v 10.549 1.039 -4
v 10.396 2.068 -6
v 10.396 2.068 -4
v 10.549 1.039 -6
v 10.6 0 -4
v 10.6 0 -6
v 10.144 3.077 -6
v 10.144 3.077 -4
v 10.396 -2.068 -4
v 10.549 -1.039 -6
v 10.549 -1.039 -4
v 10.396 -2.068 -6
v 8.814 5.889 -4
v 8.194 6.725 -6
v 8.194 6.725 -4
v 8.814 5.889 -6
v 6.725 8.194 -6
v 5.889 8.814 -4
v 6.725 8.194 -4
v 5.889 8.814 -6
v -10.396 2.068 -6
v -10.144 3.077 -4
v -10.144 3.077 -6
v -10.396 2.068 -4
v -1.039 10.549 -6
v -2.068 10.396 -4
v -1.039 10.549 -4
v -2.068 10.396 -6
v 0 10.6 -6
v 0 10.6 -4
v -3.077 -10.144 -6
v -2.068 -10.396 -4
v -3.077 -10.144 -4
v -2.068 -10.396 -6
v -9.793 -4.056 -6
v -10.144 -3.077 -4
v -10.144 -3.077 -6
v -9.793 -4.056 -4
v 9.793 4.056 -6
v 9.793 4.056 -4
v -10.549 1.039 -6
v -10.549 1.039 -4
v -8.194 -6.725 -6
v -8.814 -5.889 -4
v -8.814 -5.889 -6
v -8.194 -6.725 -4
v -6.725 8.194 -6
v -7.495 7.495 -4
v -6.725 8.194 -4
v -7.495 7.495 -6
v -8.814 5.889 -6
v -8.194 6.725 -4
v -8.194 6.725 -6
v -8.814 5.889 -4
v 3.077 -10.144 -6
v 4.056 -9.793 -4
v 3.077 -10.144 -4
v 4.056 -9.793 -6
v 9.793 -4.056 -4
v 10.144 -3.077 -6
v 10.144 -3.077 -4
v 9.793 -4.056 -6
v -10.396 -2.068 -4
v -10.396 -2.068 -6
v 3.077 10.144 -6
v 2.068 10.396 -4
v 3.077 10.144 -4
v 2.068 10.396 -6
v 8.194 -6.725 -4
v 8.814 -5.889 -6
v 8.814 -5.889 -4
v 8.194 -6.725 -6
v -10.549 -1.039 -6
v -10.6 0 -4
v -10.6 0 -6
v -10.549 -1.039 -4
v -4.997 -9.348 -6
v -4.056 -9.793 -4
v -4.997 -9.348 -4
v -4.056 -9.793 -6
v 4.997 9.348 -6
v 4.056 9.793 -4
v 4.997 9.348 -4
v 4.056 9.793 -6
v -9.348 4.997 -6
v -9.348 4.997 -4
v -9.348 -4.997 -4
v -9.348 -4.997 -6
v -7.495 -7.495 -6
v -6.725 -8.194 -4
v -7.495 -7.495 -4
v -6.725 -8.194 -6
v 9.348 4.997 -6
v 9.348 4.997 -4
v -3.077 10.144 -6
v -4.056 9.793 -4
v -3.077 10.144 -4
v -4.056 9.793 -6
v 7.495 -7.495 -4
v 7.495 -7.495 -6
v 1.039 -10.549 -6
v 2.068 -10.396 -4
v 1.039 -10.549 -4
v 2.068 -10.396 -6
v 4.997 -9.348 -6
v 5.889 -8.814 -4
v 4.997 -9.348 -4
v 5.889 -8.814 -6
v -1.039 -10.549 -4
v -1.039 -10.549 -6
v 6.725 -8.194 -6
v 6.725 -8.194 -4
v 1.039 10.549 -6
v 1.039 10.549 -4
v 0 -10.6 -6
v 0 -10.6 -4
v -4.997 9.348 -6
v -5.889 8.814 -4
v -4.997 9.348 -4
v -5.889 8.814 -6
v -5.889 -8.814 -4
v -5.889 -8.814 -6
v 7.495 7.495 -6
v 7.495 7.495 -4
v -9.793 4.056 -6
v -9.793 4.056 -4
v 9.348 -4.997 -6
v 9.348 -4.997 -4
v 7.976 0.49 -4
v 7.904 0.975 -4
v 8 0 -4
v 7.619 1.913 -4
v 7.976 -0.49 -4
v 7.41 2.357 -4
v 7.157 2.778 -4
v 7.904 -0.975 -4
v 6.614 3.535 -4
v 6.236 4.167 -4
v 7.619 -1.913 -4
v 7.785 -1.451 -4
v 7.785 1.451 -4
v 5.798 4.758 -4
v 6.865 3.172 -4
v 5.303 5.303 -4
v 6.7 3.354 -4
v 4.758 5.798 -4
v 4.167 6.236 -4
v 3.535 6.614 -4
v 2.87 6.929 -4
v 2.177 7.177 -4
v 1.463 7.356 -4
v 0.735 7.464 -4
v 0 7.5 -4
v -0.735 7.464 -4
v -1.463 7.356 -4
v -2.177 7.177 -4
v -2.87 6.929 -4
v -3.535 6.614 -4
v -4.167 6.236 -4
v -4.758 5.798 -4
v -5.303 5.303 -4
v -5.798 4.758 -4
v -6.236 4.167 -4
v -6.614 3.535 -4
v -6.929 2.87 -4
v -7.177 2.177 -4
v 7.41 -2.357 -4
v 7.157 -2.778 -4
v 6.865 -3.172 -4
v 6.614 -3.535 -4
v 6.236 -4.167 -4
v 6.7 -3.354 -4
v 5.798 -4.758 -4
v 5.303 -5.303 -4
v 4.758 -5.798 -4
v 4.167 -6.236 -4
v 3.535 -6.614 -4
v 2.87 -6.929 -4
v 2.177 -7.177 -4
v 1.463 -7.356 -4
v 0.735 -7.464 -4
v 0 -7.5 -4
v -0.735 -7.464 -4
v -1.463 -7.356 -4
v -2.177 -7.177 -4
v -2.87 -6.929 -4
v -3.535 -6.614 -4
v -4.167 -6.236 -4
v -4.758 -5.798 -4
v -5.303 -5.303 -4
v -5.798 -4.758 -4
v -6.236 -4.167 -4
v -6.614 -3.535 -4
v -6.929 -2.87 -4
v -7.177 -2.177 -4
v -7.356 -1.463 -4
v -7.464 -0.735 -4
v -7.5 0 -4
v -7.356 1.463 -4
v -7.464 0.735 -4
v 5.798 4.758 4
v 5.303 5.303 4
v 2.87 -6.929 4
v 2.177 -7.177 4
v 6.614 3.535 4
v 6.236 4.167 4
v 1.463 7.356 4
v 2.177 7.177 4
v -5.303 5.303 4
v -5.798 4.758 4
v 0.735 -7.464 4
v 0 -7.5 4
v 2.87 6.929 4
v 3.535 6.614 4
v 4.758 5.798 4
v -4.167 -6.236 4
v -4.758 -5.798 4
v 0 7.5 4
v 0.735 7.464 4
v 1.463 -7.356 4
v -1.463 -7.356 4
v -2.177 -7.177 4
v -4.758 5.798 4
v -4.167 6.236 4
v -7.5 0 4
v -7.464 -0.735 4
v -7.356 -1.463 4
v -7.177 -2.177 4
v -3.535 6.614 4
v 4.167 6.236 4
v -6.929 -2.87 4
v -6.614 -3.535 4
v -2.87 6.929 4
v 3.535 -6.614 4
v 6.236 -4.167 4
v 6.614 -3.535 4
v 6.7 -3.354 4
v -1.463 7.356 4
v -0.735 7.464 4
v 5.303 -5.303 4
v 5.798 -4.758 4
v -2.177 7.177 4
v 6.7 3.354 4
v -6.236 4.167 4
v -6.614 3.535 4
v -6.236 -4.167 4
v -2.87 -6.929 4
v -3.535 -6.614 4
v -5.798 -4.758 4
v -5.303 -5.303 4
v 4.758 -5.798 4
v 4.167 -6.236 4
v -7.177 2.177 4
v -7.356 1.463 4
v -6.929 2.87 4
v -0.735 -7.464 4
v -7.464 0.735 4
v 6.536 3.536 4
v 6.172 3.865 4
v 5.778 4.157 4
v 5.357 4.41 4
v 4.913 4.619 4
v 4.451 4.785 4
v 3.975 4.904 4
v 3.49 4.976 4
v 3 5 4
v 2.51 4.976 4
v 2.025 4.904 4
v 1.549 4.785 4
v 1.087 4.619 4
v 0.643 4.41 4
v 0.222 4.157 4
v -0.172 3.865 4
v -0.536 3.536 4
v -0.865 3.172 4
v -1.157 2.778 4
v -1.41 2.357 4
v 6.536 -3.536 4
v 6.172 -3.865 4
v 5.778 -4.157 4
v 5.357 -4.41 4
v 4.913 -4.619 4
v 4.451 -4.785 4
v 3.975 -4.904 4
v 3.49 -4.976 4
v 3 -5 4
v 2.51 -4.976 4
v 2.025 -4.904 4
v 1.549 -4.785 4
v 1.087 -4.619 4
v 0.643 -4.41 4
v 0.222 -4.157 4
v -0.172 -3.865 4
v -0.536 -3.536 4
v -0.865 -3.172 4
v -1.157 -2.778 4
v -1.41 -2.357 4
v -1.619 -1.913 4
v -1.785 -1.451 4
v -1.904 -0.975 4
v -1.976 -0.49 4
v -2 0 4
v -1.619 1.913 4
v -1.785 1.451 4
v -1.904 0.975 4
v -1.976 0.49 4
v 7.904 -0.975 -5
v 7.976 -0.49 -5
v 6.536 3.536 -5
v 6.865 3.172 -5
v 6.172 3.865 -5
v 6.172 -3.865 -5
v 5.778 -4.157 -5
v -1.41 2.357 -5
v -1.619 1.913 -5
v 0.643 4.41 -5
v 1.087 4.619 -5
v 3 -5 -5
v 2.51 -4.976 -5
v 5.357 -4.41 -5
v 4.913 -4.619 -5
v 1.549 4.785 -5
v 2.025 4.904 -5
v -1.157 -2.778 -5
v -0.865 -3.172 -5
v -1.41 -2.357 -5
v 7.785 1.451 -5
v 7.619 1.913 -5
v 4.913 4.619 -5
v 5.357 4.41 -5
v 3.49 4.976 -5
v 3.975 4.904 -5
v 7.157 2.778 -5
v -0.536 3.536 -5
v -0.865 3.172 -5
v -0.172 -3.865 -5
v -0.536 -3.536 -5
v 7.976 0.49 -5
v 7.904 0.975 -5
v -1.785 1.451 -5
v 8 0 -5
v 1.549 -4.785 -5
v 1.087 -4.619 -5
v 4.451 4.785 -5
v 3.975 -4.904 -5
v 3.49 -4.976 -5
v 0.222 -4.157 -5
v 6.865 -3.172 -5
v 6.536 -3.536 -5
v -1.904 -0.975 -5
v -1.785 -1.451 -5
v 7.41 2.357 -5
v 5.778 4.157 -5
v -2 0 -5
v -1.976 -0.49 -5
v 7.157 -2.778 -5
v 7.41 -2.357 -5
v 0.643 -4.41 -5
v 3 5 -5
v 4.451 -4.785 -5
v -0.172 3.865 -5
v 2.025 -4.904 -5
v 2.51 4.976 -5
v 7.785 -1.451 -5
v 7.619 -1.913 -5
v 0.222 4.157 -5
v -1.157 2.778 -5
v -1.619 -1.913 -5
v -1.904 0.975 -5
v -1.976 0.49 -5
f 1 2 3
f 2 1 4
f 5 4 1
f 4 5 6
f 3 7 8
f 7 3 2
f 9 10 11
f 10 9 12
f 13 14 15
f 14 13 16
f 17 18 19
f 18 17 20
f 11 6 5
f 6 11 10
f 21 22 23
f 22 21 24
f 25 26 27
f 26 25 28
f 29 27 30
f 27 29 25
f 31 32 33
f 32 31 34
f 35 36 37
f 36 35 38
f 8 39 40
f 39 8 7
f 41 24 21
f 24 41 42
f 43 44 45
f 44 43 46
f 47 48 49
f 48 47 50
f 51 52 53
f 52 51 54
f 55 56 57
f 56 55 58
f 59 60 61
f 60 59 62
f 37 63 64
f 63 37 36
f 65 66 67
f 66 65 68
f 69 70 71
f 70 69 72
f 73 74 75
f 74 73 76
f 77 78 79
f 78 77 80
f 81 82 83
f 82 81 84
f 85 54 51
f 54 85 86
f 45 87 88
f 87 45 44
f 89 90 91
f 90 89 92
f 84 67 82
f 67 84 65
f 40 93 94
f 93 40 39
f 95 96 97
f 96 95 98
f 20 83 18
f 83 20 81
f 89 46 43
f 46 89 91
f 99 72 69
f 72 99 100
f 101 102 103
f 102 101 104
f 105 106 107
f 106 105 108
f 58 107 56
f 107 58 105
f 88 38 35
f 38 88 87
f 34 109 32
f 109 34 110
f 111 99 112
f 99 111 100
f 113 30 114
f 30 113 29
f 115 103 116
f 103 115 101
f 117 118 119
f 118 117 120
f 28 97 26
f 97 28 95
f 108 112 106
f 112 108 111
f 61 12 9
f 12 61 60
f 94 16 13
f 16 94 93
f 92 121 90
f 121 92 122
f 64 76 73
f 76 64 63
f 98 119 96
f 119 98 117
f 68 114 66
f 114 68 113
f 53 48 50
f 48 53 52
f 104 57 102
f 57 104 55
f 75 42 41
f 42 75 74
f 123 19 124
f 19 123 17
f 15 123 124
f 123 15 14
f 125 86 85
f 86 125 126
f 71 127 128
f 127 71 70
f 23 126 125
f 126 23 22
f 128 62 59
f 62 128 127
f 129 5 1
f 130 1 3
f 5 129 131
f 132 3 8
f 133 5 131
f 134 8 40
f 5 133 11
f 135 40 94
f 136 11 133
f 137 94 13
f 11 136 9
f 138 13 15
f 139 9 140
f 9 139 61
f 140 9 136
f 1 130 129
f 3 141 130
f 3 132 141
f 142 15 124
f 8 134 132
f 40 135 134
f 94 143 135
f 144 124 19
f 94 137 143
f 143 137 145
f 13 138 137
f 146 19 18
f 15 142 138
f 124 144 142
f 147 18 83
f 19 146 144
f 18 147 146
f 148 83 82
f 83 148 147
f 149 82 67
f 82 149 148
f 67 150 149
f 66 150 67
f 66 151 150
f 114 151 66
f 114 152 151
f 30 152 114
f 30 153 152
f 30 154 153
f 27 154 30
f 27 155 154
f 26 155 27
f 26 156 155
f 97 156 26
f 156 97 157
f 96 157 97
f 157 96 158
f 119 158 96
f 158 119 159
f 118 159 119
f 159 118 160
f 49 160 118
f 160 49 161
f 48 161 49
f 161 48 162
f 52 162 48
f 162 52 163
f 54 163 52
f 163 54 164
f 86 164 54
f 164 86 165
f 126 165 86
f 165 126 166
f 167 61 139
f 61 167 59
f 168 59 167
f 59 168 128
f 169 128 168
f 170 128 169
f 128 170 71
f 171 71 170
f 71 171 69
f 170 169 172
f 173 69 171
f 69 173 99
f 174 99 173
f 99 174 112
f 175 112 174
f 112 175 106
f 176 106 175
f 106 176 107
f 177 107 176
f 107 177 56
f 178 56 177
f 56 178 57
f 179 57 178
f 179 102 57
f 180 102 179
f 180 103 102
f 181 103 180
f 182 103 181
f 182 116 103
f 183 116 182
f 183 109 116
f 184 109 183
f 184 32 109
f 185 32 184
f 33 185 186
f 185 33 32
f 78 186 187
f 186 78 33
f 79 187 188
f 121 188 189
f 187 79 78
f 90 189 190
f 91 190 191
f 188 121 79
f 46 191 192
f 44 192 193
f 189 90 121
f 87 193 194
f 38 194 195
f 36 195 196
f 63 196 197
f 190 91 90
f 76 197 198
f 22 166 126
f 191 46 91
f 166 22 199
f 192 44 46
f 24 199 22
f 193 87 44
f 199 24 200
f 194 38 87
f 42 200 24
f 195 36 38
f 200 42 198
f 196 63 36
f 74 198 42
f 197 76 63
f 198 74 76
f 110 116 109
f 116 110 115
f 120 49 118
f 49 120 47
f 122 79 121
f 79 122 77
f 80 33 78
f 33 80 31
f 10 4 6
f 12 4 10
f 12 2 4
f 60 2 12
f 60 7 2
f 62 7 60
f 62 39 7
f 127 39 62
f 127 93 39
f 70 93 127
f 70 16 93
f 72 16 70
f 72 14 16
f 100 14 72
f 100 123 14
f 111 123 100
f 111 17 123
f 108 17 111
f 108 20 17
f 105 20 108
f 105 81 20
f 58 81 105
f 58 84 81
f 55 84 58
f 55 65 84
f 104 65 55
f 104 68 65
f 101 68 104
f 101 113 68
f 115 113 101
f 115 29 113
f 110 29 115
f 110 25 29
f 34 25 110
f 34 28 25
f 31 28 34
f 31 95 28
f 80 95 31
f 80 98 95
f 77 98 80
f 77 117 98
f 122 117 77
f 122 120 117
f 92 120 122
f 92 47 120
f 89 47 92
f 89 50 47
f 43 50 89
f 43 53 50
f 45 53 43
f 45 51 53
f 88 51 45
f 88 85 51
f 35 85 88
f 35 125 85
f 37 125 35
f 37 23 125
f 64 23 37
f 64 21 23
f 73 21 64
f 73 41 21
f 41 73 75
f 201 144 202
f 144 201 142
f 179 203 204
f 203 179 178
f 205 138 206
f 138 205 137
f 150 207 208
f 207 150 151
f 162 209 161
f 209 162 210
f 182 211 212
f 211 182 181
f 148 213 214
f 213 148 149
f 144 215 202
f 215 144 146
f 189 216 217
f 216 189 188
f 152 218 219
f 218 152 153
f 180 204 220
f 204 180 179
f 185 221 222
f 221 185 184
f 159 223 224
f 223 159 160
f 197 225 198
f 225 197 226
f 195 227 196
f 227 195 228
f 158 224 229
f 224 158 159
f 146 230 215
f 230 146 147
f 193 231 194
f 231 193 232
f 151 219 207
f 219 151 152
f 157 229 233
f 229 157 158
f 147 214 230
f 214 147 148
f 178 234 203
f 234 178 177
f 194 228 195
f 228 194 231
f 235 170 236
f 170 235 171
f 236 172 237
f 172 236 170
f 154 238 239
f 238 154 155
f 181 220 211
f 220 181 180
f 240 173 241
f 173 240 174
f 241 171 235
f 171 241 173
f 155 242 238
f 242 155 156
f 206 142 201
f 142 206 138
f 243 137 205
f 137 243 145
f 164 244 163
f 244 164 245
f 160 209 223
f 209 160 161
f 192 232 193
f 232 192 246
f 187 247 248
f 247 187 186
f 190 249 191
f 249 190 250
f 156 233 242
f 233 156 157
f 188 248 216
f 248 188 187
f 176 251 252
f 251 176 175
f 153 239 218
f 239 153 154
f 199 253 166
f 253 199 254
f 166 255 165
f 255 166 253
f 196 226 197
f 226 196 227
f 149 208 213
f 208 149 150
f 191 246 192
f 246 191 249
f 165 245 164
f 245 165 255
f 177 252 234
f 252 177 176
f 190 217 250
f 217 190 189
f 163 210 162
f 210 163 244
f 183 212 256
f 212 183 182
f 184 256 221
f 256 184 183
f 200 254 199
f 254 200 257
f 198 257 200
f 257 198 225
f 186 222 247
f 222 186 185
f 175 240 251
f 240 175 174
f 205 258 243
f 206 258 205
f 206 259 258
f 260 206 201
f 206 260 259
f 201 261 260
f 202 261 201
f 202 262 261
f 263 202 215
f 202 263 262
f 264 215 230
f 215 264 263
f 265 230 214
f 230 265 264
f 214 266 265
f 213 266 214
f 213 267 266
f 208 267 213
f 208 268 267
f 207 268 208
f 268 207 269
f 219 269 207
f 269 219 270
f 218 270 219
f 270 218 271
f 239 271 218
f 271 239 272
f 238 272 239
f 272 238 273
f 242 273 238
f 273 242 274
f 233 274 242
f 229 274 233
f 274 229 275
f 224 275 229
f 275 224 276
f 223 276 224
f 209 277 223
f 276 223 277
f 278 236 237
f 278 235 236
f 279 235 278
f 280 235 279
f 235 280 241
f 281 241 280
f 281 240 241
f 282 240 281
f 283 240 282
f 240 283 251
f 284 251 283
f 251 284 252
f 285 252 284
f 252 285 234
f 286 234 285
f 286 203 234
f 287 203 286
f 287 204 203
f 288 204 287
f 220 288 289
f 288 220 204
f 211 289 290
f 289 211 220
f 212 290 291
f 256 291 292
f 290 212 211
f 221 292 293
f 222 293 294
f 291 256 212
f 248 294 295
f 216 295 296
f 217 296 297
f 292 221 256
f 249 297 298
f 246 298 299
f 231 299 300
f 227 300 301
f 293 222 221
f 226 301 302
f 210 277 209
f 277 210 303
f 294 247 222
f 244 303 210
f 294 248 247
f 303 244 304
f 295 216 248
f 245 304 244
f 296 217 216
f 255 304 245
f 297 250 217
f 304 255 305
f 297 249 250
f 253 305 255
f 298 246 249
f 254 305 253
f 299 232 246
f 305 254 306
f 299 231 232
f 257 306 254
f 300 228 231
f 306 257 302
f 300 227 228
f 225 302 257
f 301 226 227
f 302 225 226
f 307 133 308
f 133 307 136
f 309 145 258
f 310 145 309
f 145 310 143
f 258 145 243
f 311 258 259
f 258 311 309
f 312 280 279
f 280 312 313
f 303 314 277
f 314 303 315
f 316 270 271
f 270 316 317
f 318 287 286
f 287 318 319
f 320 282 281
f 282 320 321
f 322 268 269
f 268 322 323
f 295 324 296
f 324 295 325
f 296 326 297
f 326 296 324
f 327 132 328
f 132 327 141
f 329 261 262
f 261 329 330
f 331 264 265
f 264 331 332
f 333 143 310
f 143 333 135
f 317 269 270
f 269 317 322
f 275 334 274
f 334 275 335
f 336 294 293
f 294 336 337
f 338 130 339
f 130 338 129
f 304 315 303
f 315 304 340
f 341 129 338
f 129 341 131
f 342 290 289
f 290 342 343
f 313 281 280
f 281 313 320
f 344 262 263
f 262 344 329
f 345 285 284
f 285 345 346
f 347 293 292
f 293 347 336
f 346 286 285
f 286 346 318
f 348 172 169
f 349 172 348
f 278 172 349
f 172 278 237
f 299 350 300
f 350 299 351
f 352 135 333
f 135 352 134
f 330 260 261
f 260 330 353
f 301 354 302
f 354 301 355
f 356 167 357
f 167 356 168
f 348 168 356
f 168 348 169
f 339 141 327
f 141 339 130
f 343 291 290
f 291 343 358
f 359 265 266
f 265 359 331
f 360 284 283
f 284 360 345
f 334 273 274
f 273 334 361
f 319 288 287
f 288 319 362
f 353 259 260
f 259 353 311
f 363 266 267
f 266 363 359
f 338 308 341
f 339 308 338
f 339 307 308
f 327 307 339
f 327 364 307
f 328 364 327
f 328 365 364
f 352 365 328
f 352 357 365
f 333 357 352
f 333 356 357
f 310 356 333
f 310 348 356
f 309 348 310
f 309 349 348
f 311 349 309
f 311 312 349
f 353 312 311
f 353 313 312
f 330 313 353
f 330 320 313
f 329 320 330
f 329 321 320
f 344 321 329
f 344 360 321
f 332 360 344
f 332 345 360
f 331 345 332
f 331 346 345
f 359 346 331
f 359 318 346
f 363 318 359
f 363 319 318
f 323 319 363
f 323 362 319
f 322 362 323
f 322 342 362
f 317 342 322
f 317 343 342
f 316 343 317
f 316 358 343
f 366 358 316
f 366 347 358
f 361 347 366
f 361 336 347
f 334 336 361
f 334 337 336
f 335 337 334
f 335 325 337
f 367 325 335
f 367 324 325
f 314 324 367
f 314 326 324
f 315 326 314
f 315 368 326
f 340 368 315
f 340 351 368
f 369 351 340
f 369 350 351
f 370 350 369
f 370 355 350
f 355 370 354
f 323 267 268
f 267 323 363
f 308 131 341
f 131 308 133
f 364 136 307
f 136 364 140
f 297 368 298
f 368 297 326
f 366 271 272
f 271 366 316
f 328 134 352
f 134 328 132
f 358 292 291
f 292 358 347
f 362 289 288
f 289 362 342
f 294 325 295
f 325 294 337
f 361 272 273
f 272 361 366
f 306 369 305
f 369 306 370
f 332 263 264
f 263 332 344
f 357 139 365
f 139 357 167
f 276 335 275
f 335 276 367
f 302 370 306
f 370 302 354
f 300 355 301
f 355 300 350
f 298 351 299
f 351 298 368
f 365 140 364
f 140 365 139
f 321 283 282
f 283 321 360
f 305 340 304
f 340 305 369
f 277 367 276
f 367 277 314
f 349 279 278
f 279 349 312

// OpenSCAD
module flanged_bushing() {
    difference() {
        // Main body with flange
        union() {
            // Flange
            translate([0, 0, -1])
                cylinder(h=2, d=21.2, $fn=64);
            // Main cylinder
            translate([0, 0, 1])
                cylinder(h=8, d=15, $fn=64);
        }
        // Eccentric hole
        translate([3, 0, 0])
            cylinder(h=10, d=10, $fn=64);
    }
}

translate([0, 0, -5])
    flanged_bushing();
